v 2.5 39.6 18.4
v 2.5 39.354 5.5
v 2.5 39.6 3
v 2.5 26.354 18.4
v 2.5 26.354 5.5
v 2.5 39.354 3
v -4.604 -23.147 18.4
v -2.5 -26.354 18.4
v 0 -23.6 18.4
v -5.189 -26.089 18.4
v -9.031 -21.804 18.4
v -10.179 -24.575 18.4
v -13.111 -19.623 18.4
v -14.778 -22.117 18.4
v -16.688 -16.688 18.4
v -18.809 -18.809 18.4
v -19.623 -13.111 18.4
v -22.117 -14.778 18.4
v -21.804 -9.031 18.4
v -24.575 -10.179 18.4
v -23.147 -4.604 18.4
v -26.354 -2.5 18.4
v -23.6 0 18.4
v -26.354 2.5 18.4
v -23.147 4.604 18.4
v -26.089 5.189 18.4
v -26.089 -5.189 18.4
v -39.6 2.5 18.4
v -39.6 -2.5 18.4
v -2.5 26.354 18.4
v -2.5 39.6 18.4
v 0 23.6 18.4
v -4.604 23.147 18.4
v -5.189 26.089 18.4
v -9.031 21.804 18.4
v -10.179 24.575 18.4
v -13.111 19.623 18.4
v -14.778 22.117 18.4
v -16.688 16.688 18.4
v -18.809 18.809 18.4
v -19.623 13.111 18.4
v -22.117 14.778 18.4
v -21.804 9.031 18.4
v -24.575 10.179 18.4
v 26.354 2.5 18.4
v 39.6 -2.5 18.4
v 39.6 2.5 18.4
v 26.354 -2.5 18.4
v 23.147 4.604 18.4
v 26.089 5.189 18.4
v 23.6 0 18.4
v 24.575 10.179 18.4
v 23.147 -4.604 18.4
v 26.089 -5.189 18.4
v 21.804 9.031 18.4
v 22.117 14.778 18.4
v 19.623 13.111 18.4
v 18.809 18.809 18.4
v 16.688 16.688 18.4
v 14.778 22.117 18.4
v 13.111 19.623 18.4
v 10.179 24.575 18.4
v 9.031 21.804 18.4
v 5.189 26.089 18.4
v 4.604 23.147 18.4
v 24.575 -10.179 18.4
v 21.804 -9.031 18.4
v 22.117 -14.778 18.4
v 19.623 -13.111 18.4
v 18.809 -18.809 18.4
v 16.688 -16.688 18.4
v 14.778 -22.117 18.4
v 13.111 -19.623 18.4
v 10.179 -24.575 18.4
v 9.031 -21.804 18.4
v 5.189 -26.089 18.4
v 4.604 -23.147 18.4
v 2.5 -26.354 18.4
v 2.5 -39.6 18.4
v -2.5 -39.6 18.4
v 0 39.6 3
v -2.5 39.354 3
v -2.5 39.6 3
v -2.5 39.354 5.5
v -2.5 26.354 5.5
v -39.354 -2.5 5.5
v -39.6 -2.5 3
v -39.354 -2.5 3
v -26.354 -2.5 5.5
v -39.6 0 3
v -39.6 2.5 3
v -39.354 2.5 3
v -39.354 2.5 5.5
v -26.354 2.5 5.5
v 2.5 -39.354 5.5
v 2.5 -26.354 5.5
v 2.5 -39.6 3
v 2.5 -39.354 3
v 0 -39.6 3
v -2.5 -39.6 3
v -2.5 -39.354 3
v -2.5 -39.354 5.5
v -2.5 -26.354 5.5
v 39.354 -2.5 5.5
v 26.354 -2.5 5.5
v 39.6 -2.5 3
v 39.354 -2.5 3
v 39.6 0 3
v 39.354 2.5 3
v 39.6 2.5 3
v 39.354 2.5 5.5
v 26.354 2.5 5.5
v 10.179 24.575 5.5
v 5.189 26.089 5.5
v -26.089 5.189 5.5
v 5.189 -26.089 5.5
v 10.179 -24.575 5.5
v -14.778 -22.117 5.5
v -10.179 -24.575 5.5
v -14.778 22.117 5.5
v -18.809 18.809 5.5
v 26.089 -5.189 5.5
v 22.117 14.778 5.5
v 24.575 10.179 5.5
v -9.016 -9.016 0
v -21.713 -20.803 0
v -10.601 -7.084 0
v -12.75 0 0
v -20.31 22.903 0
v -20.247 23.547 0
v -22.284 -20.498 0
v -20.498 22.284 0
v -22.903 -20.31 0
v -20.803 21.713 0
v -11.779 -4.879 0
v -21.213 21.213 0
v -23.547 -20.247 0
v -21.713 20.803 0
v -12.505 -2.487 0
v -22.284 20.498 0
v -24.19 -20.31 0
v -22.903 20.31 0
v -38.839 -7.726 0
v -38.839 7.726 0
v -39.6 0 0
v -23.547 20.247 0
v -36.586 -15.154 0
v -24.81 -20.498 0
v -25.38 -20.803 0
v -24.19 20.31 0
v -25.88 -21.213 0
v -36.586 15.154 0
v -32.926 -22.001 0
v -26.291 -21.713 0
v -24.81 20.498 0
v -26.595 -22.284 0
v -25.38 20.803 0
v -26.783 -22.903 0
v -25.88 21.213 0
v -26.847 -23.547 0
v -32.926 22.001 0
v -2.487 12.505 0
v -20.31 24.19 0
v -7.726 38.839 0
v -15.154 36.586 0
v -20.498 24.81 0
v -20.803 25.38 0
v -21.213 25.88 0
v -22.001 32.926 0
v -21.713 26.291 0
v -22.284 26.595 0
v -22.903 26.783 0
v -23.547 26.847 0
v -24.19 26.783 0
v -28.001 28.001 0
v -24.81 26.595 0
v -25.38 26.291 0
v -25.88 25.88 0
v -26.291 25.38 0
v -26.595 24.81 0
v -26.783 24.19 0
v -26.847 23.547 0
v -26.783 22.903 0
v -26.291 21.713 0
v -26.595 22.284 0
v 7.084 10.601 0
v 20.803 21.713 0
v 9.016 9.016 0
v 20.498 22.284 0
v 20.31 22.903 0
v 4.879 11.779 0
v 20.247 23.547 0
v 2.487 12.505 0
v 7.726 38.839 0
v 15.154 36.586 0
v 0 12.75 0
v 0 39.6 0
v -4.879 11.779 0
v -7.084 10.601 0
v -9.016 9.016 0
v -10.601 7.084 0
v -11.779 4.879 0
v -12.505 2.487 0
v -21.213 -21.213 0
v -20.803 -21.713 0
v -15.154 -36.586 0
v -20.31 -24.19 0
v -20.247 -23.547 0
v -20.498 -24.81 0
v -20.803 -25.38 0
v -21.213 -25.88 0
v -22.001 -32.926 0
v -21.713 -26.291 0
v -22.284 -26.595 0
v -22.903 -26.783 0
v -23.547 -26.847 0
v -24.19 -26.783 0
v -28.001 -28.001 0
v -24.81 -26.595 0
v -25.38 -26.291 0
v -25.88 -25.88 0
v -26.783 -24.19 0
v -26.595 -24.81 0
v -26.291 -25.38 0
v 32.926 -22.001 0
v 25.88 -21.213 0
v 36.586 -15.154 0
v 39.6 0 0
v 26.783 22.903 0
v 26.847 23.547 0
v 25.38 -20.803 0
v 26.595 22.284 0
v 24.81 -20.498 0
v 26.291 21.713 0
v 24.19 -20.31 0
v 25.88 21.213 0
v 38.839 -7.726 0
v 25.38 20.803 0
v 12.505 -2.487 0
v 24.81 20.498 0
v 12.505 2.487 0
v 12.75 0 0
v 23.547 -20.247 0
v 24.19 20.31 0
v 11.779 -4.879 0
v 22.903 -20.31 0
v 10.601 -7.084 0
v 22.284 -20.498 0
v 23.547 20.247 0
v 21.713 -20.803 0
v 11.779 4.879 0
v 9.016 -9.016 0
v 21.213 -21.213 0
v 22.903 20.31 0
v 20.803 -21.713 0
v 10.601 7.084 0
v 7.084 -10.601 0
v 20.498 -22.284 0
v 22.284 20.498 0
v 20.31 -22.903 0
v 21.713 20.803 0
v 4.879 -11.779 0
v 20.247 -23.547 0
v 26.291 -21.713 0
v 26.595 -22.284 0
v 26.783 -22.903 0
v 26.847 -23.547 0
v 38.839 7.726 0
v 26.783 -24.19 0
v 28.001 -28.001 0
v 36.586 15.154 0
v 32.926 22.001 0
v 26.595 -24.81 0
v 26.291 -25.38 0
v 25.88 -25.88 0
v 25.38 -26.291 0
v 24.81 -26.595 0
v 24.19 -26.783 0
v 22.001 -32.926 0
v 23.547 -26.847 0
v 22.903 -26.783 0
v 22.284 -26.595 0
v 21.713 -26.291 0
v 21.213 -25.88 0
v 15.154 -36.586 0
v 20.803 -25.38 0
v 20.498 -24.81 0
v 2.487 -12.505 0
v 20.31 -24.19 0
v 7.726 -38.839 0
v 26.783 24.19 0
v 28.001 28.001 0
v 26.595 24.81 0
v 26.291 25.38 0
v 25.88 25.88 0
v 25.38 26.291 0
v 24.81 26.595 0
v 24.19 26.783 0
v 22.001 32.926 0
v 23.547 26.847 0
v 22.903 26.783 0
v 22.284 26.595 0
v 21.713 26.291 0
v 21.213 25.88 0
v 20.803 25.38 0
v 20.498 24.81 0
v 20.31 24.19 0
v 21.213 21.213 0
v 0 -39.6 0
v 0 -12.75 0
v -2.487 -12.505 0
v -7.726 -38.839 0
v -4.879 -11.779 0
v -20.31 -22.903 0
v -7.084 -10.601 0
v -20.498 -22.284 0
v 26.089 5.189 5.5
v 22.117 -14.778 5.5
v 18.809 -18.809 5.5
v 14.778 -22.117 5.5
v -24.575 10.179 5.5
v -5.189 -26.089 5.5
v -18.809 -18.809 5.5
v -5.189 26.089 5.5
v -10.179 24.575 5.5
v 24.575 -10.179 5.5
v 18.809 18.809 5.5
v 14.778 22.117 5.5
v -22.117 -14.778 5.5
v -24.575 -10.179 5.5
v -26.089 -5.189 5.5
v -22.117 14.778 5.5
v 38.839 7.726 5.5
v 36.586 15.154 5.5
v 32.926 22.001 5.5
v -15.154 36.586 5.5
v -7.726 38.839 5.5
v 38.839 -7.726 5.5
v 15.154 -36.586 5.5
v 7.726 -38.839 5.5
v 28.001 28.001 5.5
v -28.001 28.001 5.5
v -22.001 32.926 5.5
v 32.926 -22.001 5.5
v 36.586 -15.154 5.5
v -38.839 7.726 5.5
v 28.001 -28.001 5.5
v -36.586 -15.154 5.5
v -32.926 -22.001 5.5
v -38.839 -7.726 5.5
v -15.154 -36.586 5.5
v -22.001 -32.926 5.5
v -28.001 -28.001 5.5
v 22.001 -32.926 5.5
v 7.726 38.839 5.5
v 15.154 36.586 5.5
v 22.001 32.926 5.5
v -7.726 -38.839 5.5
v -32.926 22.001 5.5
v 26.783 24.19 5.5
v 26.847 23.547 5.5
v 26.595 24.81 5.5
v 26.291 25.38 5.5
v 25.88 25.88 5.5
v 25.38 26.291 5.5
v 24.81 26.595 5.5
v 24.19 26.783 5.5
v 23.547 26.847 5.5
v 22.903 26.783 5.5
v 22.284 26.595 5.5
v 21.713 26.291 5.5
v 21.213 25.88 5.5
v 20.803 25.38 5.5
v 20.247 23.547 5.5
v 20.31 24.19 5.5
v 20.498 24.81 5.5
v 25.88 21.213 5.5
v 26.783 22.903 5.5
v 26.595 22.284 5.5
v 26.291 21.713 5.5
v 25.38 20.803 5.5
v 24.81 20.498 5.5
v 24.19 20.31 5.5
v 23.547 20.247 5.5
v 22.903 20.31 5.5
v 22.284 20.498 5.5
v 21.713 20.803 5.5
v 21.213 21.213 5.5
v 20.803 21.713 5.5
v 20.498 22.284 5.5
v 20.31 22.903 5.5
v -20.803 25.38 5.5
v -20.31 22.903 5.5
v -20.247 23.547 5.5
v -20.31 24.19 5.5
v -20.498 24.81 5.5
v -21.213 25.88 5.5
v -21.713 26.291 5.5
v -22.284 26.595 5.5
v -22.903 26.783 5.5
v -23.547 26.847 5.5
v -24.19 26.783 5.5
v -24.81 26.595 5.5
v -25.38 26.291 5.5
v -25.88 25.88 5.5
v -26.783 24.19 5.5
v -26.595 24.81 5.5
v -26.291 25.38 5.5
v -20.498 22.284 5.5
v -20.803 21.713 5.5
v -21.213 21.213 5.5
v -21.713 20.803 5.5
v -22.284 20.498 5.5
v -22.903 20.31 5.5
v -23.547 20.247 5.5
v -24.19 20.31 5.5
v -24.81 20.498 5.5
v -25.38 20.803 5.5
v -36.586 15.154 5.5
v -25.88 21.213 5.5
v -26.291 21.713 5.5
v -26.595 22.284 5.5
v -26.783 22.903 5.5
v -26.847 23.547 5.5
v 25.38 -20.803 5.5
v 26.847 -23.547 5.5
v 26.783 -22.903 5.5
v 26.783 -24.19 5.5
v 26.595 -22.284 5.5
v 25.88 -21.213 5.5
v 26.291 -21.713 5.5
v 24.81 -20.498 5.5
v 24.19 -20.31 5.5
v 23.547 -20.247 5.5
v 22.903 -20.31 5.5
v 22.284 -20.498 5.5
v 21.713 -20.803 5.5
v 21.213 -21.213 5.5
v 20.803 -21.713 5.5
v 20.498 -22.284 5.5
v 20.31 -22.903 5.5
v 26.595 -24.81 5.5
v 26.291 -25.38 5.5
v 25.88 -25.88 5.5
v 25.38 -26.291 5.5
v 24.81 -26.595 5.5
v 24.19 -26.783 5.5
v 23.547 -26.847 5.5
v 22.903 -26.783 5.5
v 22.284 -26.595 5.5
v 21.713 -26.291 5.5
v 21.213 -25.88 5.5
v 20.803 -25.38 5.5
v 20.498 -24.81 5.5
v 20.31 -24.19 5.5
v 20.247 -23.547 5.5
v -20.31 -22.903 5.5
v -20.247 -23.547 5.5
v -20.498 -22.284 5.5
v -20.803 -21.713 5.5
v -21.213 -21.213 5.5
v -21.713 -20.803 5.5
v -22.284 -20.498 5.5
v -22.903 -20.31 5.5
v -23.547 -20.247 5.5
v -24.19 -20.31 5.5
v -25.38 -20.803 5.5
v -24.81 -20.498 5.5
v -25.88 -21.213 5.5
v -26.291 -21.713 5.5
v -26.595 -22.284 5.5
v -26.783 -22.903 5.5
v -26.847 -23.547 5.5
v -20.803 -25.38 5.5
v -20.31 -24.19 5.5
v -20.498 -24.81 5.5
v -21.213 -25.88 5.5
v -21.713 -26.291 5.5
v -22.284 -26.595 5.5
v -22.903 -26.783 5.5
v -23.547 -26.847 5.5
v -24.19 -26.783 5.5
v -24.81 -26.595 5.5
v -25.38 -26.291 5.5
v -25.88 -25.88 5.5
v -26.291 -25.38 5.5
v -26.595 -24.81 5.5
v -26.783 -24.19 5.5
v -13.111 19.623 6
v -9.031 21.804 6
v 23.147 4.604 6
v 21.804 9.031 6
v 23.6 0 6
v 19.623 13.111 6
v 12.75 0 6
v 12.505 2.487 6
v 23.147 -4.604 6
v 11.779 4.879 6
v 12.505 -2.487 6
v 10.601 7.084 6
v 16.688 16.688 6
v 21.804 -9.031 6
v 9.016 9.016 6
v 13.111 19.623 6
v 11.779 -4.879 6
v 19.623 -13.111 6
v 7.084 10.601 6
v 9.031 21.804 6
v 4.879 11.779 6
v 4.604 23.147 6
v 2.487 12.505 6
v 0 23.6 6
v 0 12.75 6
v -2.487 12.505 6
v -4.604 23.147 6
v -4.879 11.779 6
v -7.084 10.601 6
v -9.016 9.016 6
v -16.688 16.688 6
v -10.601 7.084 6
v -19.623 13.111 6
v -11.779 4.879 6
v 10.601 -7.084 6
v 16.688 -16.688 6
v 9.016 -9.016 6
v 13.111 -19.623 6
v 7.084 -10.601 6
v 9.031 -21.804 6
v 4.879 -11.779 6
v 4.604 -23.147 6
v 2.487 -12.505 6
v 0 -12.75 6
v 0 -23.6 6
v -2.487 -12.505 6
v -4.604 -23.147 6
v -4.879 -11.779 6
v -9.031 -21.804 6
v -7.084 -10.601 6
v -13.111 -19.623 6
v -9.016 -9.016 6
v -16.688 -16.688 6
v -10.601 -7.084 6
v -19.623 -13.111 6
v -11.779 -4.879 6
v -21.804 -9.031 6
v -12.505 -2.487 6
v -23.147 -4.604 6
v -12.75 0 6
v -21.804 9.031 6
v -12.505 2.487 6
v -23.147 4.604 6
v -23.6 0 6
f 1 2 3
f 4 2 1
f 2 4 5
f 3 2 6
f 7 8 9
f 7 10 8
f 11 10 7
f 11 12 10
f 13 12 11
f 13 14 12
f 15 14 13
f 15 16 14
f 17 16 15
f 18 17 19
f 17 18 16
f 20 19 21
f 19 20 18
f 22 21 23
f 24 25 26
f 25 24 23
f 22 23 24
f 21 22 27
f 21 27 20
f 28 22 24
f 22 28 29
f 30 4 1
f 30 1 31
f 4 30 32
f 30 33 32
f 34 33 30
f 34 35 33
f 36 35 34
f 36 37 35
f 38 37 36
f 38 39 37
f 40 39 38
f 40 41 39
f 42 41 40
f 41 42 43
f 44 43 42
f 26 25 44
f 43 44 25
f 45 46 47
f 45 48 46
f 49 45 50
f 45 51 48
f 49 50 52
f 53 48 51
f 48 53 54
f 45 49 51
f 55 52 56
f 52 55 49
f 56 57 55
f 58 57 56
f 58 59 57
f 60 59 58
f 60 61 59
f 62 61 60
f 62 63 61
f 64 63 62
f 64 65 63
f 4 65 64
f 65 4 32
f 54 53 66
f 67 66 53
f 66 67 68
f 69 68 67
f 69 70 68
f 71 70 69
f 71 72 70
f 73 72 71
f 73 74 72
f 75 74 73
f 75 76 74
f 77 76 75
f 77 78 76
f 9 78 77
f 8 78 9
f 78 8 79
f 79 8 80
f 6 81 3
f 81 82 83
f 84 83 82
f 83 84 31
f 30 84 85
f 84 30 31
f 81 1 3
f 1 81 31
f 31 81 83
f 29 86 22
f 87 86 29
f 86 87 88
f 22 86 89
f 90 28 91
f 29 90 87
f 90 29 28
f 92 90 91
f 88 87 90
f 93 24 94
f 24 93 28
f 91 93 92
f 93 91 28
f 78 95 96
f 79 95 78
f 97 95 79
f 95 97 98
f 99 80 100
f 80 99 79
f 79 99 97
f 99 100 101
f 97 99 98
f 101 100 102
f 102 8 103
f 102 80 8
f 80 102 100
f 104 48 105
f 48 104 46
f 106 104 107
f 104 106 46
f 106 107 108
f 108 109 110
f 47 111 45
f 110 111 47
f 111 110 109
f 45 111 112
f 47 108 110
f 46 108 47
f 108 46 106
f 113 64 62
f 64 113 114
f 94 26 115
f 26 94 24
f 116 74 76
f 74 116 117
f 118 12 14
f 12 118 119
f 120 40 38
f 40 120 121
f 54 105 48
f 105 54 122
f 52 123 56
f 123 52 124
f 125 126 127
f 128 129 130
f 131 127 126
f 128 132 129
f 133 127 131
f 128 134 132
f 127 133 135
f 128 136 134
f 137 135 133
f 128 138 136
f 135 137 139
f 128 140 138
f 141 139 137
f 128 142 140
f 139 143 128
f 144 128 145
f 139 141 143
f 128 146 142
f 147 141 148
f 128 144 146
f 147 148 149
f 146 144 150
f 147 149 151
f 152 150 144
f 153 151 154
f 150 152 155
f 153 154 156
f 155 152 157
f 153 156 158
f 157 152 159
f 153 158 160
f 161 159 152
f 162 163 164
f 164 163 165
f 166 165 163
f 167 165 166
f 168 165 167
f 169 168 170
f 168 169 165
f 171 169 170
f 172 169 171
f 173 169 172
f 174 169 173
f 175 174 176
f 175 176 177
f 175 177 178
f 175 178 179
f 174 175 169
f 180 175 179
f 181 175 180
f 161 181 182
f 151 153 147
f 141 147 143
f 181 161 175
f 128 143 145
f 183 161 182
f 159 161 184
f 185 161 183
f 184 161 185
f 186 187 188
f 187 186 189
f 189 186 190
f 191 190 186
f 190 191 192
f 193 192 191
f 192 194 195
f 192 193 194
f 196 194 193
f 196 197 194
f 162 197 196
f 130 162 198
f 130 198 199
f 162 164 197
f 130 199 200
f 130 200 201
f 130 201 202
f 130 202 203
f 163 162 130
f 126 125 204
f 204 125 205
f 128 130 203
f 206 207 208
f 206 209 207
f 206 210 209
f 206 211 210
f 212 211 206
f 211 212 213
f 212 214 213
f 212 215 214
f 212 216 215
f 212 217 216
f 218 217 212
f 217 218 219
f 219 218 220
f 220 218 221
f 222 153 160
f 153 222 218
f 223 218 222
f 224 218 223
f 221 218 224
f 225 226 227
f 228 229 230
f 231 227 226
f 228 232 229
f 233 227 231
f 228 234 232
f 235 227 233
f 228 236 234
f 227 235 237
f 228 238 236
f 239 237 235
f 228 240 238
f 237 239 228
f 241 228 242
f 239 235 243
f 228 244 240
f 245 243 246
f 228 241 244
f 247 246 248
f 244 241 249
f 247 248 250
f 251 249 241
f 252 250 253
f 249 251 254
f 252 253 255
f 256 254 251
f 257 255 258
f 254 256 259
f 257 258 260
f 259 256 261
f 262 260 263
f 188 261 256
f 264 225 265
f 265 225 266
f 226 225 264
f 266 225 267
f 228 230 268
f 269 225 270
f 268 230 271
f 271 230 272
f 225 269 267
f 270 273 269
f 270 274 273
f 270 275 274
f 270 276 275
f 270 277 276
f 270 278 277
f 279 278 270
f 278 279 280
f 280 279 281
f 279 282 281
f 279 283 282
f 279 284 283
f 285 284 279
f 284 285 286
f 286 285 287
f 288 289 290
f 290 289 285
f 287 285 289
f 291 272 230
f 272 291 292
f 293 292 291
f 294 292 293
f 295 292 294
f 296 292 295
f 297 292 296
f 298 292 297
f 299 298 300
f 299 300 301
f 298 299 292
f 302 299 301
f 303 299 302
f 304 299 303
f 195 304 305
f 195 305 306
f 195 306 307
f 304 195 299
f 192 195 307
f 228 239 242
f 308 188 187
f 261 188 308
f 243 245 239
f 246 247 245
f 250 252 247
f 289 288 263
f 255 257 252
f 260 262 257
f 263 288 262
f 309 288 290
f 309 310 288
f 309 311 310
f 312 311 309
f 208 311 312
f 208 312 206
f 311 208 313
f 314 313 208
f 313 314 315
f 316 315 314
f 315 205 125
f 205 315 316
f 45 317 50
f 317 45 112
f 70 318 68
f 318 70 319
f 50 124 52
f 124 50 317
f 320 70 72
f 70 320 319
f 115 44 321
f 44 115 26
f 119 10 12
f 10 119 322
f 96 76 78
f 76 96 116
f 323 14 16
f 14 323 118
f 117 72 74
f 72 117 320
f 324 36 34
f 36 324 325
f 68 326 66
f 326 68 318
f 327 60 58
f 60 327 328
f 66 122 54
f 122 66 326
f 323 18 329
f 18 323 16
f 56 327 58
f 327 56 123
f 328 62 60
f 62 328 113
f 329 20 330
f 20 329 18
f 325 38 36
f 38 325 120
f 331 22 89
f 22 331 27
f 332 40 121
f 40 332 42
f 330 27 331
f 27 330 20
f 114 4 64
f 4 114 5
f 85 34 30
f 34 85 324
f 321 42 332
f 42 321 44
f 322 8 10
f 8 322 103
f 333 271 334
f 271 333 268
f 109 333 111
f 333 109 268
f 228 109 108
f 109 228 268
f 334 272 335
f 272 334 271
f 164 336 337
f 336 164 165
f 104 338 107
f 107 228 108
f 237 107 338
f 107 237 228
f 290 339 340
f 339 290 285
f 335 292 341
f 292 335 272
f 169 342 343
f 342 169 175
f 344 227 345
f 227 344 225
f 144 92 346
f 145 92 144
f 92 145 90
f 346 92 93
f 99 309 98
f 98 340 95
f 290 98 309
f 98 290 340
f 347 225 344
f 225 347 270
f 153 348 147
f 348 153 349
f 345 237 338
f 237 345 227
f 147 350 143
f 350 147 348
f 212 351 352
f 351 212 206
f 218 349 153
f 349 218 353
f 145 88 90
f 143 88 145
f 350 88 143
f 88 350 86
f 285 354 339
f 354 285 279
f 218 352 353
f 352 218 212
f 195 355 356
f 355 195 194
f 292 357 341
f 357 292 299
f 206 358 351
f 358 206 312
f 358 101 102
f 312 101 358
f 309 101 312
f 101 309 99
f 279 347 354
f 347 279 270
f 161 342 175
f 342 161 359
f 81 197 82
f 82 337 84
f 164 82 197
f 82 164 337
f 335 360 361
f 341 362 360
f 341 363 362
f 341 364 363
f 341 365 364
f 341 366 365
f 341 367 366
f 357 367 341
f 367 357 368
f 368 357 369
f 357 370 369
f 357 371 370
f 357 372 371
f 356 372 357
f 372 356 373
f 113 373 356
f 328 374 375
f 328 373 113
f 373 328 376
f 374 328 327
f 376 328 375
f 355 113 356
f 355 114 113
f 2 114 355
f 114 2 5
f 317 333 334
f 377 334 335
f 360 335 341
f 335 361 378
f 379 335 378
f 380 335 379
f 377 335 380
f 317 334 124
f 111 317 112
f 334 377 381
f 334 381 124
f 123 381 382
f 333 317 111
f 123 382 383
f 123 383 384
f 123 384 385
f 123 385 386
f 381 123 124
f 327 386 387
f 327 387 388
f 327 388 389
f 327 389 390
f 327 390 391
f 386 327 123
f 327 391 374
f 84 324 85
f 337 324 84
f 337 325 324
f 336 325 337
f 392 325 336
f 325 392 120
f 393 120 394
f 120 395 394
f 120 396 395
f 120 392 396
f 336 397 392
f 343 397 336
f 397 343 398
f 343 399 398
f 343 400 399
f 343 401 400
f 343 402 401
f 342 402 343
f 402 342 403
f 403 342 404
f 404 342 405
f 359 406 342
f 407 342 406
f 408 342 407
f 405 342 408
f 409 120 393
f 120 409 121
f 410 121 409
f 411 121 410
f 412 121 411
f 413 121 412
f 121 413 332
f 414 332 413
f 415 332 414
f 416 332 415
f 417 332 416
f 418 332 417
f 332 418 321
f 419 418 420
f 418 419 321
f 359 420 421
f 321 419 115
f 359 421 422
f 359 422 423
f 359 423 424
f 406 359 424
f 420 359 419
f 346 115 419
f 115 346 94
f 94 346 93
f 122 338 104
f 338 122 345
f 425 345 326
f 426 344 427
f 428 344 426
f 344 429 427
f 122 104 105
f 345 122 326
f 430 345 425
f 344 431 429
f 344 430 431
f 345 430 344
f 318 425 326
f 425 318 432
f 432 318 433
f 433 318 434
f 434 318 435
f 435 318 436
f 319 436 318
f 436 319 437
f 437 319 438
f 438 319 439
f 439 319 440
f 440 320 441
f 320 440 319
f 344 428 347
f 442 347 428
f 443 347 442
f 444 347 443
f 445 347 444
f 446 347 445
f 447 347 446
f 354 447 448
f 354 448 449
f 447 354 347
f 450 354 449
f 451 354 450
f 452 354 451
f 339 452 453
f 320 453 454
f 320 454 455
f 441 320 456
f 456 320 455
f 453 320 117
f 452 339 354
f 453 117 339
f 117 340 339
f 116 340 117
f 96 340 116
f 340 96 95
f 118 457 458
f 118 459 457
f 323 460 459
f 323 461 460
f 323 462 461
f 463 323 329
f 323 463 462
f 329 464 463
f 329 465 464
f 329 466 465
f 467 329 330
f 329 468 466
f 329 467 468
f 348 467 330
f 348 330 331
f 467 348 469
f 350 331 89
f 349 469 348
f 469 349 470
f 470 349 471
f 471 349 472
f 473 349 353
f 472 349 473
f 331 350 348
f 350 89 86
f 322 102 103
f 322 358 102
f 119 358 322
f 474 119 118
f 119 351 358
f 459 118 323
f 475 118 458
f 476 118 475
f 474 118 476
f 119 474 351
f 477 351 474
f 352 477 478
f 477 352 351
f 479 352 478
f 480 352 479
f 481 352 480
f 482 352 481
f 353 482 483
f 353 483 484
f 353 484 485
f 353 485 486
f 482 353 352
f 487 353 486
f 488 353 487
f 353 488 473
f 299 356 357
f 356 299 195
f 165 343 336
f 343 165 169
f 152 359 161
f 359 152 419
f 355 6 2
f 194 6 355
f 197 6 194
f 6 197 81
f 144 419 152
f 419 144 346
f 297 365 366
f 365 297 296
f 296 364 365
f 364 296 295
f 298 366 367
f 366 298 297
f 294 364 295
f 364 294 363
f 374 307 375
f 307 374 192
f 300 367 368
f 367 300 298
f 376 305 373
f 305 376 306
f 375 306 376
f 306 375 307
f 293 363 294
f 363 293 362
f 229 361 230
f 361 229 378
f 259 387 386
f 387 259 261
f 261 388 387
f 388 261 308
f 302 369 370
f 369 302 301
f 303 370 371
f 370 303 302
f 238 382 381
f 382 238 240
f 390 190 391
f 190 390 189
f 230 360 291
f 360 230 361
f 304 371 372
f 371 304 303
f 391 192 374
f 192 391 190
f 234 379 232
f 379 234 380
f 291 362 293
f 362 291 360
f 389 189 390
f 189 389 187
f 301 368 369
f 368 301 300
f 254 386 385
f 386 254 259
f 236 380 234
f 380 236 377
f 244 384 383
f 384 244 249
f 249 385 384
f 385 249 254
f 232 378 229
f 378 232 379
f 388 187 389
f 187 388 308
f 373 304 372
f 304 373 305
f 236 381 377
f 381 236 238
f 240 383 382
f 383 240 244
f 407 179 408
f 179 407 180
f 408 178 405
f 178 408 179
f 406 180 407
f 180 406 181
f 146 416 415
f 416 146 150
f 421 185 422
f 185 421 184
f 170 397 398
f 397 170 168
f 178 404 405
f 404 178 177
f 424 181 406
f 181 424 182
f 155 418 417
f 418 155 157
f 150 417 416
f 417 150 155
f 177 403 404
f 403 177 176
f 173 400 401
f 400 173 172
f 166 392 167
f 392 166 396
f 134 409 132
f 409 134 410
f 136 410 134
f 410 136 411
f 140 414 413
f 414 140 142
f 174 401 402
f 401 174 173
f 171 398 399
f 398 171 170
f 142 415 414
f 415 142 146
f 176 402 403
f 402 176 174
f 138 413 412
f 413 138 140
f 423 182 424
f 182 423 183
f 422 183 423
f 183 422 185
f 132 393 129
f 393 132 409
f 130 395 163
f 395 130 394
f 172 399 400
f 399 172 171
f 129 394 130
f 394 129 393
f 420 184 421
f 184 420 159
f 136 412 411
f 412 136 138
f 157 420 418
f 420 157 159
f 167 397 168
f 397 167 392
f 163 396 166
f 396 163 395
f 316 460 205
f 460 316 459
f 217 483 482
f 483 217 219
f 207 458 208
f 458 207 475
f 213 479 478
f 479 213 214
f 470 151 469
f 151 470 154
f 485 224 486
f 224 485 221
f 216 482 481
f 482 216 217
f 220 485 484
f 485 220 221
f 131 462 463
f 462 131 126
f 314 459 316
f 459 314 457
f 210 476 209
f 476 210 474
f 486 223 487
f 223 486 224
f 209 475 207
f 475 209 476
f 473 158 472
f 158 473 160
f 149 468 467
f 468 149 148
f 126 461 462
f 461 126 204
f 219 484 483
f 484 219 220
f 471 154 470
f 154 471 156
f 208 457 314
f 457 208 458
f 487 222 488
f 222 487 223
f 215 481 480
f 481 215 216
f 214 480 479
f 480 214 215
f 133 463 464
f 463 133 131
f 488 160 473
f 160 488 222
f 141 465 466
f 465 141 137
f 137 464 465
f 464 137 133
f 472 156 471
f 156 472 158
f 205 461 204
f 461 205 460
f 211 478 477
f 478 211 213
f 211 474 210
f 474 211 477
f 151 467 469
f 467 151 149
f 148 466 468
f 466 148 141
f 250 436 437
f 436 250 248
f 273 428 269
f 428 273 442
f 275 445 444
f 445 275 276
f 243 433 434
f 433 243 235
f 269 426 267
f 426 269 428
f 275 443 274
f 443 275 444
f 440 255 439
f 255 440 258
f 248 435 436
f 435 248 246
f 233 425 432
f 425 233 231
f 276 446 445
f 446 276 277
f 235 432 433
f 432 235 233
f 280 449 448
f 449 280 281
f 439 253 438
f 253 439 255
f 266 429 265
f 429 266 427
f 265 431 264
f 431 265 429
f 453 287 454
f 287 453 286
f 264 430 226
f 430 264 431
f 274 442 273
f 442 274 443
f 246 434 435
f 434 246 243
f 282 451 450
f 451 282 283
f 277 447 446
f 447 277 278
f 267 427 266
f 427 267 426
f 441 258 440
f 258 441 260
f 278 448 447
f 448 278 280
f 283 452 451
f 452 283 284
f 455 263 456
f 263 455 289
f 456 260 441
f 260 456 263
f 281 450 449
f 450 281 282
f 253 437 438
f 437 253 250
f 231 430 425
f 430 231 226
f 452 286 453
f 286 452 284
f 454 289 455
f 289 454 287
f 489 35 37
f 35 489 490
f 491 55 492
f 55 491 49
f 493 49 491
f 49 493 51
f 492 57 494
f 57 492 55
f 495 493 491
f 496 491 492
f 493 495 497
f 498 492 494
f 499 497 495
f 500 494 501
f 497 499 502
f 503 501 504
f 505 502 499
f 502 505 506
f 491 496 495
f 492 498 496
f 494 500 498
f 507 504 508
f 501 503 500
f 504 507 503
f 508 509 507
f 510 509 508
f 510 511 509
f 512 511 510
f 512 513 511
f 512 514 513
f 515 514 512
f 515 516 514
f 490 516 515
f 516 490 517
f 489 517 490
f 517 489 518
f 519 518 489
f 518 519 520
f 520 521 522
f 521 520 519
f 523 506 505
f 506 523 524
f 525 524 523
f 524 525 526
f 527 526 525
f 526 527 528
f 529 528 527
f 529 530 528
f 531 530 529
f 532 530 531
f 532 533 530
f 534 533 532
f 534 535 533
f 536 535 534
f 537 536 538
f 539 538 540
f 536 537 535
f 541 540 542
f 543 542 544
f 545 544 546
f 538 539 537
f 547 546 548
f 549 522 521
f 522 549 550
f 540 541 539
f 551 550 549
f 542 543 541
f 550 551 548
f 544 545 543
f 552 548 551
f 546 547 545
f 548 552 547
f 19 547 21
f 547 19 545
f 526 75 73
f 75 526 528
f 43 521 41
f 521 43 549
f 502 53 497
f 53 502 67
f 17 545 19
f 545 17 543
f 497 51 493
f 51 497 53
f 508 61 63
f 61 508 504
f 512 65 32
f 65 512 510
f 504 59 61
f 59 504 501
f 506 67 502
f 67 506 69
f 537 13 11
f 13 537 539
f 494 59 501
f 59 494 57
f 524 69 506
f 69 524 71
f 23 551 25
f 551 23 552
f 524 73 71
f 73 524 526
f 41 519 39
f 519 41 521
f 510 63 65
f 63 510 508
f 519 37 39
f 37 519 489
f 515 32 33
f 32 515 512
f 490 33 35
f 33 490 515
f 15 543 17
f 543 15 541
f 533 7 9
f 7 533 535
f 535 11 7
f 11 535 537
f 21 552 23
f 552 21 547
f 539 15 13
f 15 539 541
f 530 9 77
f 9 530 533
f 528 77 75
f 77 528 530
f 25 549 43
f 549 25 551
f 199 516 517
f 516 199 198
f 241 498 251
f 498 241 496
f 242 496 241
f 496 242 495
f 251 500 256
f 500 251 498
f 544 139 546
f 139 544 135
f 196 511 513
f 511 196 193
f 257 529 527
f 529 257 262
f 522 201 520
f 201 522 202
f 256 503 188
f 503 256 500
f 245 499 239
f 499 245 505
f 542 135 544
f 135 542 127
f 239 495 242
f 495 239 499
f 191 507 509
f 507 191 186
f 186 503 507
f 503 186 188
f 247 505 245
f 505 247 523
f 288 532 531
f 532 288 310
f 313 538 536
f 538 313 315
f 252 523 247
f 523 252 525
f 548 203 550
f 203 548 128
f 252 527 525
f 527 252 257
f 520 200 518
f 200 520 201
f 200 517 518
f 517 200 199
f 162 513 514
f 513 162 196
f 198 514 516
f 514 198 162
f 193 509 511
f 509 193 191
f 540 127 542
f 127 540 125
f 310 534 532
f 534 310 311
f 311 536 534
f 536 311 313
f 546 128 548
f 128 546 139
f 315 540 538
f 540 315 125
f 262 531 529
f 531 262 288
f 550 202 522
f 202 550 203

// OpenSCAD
$fn = 32;

// ----------------------------------------------------------------------
// Bearing housing: seat for 6005 (47 x 12 mm), 53.2 mm body
// ----------------------------------------------------------------------

// --- parameters (mm) ---
body_od = 53.2;           // housing outside diameter
body_h = 18.4;            // overall housing height
wall = 3;                 // wall thickness
pocket_d = 47.2;          // 6005 seat, 0.2 mm clearance
seat_h = 12.4;            // pocket depth
shoulder = 2;             // shoulder under the bearing
pass_d = 25.5;            // shaft passage
flange_dia = 79.2;        // mounting flange diameter
flange_t = 4;             // flange thickness
bolt_d = 6.6;             // flange bolt clearance
bolt_r = 33.3;            // flange bolt circle radius
rib_w = 5;                // rib width
rib_n = 4;                // rib count

module body() {
  cylinder(h = body_h, d = body_od);
}

module flange() {
  /* flange sunk 1.5 mm into the body */
  cylinder(h = flange_t + 1.5, d = flange_dia);
}

module ribs() {
  for (i = [0 : rib_n - 1])
    rotate([0, 0, i * 360 / rib_n])
      translate([-rib_w / 2, body_od / 2 - 0.8, flange_t - 1])
        cube([rib_w, (flange_dia - body_od) / 2 + 0.8, body_h - flange_t + 1]);
}

difference() {
  union() {
    body();
    flange();
    ribs();
  }
  translate([0, 0, body_h - seat_h]) cylinder(h = seat_h + 1, d = pocket_d);
  translate([0, 0, -1]) cylinder(h = body_h - seat_h + 1, d = pass_d);
  for (i = [0 : 3]) rotate([0, 0, 45 + i * 90]) translate([bolt_r, 0, -1])
    cylinder(h = flange_t + 3, d = bolt_d);
}
